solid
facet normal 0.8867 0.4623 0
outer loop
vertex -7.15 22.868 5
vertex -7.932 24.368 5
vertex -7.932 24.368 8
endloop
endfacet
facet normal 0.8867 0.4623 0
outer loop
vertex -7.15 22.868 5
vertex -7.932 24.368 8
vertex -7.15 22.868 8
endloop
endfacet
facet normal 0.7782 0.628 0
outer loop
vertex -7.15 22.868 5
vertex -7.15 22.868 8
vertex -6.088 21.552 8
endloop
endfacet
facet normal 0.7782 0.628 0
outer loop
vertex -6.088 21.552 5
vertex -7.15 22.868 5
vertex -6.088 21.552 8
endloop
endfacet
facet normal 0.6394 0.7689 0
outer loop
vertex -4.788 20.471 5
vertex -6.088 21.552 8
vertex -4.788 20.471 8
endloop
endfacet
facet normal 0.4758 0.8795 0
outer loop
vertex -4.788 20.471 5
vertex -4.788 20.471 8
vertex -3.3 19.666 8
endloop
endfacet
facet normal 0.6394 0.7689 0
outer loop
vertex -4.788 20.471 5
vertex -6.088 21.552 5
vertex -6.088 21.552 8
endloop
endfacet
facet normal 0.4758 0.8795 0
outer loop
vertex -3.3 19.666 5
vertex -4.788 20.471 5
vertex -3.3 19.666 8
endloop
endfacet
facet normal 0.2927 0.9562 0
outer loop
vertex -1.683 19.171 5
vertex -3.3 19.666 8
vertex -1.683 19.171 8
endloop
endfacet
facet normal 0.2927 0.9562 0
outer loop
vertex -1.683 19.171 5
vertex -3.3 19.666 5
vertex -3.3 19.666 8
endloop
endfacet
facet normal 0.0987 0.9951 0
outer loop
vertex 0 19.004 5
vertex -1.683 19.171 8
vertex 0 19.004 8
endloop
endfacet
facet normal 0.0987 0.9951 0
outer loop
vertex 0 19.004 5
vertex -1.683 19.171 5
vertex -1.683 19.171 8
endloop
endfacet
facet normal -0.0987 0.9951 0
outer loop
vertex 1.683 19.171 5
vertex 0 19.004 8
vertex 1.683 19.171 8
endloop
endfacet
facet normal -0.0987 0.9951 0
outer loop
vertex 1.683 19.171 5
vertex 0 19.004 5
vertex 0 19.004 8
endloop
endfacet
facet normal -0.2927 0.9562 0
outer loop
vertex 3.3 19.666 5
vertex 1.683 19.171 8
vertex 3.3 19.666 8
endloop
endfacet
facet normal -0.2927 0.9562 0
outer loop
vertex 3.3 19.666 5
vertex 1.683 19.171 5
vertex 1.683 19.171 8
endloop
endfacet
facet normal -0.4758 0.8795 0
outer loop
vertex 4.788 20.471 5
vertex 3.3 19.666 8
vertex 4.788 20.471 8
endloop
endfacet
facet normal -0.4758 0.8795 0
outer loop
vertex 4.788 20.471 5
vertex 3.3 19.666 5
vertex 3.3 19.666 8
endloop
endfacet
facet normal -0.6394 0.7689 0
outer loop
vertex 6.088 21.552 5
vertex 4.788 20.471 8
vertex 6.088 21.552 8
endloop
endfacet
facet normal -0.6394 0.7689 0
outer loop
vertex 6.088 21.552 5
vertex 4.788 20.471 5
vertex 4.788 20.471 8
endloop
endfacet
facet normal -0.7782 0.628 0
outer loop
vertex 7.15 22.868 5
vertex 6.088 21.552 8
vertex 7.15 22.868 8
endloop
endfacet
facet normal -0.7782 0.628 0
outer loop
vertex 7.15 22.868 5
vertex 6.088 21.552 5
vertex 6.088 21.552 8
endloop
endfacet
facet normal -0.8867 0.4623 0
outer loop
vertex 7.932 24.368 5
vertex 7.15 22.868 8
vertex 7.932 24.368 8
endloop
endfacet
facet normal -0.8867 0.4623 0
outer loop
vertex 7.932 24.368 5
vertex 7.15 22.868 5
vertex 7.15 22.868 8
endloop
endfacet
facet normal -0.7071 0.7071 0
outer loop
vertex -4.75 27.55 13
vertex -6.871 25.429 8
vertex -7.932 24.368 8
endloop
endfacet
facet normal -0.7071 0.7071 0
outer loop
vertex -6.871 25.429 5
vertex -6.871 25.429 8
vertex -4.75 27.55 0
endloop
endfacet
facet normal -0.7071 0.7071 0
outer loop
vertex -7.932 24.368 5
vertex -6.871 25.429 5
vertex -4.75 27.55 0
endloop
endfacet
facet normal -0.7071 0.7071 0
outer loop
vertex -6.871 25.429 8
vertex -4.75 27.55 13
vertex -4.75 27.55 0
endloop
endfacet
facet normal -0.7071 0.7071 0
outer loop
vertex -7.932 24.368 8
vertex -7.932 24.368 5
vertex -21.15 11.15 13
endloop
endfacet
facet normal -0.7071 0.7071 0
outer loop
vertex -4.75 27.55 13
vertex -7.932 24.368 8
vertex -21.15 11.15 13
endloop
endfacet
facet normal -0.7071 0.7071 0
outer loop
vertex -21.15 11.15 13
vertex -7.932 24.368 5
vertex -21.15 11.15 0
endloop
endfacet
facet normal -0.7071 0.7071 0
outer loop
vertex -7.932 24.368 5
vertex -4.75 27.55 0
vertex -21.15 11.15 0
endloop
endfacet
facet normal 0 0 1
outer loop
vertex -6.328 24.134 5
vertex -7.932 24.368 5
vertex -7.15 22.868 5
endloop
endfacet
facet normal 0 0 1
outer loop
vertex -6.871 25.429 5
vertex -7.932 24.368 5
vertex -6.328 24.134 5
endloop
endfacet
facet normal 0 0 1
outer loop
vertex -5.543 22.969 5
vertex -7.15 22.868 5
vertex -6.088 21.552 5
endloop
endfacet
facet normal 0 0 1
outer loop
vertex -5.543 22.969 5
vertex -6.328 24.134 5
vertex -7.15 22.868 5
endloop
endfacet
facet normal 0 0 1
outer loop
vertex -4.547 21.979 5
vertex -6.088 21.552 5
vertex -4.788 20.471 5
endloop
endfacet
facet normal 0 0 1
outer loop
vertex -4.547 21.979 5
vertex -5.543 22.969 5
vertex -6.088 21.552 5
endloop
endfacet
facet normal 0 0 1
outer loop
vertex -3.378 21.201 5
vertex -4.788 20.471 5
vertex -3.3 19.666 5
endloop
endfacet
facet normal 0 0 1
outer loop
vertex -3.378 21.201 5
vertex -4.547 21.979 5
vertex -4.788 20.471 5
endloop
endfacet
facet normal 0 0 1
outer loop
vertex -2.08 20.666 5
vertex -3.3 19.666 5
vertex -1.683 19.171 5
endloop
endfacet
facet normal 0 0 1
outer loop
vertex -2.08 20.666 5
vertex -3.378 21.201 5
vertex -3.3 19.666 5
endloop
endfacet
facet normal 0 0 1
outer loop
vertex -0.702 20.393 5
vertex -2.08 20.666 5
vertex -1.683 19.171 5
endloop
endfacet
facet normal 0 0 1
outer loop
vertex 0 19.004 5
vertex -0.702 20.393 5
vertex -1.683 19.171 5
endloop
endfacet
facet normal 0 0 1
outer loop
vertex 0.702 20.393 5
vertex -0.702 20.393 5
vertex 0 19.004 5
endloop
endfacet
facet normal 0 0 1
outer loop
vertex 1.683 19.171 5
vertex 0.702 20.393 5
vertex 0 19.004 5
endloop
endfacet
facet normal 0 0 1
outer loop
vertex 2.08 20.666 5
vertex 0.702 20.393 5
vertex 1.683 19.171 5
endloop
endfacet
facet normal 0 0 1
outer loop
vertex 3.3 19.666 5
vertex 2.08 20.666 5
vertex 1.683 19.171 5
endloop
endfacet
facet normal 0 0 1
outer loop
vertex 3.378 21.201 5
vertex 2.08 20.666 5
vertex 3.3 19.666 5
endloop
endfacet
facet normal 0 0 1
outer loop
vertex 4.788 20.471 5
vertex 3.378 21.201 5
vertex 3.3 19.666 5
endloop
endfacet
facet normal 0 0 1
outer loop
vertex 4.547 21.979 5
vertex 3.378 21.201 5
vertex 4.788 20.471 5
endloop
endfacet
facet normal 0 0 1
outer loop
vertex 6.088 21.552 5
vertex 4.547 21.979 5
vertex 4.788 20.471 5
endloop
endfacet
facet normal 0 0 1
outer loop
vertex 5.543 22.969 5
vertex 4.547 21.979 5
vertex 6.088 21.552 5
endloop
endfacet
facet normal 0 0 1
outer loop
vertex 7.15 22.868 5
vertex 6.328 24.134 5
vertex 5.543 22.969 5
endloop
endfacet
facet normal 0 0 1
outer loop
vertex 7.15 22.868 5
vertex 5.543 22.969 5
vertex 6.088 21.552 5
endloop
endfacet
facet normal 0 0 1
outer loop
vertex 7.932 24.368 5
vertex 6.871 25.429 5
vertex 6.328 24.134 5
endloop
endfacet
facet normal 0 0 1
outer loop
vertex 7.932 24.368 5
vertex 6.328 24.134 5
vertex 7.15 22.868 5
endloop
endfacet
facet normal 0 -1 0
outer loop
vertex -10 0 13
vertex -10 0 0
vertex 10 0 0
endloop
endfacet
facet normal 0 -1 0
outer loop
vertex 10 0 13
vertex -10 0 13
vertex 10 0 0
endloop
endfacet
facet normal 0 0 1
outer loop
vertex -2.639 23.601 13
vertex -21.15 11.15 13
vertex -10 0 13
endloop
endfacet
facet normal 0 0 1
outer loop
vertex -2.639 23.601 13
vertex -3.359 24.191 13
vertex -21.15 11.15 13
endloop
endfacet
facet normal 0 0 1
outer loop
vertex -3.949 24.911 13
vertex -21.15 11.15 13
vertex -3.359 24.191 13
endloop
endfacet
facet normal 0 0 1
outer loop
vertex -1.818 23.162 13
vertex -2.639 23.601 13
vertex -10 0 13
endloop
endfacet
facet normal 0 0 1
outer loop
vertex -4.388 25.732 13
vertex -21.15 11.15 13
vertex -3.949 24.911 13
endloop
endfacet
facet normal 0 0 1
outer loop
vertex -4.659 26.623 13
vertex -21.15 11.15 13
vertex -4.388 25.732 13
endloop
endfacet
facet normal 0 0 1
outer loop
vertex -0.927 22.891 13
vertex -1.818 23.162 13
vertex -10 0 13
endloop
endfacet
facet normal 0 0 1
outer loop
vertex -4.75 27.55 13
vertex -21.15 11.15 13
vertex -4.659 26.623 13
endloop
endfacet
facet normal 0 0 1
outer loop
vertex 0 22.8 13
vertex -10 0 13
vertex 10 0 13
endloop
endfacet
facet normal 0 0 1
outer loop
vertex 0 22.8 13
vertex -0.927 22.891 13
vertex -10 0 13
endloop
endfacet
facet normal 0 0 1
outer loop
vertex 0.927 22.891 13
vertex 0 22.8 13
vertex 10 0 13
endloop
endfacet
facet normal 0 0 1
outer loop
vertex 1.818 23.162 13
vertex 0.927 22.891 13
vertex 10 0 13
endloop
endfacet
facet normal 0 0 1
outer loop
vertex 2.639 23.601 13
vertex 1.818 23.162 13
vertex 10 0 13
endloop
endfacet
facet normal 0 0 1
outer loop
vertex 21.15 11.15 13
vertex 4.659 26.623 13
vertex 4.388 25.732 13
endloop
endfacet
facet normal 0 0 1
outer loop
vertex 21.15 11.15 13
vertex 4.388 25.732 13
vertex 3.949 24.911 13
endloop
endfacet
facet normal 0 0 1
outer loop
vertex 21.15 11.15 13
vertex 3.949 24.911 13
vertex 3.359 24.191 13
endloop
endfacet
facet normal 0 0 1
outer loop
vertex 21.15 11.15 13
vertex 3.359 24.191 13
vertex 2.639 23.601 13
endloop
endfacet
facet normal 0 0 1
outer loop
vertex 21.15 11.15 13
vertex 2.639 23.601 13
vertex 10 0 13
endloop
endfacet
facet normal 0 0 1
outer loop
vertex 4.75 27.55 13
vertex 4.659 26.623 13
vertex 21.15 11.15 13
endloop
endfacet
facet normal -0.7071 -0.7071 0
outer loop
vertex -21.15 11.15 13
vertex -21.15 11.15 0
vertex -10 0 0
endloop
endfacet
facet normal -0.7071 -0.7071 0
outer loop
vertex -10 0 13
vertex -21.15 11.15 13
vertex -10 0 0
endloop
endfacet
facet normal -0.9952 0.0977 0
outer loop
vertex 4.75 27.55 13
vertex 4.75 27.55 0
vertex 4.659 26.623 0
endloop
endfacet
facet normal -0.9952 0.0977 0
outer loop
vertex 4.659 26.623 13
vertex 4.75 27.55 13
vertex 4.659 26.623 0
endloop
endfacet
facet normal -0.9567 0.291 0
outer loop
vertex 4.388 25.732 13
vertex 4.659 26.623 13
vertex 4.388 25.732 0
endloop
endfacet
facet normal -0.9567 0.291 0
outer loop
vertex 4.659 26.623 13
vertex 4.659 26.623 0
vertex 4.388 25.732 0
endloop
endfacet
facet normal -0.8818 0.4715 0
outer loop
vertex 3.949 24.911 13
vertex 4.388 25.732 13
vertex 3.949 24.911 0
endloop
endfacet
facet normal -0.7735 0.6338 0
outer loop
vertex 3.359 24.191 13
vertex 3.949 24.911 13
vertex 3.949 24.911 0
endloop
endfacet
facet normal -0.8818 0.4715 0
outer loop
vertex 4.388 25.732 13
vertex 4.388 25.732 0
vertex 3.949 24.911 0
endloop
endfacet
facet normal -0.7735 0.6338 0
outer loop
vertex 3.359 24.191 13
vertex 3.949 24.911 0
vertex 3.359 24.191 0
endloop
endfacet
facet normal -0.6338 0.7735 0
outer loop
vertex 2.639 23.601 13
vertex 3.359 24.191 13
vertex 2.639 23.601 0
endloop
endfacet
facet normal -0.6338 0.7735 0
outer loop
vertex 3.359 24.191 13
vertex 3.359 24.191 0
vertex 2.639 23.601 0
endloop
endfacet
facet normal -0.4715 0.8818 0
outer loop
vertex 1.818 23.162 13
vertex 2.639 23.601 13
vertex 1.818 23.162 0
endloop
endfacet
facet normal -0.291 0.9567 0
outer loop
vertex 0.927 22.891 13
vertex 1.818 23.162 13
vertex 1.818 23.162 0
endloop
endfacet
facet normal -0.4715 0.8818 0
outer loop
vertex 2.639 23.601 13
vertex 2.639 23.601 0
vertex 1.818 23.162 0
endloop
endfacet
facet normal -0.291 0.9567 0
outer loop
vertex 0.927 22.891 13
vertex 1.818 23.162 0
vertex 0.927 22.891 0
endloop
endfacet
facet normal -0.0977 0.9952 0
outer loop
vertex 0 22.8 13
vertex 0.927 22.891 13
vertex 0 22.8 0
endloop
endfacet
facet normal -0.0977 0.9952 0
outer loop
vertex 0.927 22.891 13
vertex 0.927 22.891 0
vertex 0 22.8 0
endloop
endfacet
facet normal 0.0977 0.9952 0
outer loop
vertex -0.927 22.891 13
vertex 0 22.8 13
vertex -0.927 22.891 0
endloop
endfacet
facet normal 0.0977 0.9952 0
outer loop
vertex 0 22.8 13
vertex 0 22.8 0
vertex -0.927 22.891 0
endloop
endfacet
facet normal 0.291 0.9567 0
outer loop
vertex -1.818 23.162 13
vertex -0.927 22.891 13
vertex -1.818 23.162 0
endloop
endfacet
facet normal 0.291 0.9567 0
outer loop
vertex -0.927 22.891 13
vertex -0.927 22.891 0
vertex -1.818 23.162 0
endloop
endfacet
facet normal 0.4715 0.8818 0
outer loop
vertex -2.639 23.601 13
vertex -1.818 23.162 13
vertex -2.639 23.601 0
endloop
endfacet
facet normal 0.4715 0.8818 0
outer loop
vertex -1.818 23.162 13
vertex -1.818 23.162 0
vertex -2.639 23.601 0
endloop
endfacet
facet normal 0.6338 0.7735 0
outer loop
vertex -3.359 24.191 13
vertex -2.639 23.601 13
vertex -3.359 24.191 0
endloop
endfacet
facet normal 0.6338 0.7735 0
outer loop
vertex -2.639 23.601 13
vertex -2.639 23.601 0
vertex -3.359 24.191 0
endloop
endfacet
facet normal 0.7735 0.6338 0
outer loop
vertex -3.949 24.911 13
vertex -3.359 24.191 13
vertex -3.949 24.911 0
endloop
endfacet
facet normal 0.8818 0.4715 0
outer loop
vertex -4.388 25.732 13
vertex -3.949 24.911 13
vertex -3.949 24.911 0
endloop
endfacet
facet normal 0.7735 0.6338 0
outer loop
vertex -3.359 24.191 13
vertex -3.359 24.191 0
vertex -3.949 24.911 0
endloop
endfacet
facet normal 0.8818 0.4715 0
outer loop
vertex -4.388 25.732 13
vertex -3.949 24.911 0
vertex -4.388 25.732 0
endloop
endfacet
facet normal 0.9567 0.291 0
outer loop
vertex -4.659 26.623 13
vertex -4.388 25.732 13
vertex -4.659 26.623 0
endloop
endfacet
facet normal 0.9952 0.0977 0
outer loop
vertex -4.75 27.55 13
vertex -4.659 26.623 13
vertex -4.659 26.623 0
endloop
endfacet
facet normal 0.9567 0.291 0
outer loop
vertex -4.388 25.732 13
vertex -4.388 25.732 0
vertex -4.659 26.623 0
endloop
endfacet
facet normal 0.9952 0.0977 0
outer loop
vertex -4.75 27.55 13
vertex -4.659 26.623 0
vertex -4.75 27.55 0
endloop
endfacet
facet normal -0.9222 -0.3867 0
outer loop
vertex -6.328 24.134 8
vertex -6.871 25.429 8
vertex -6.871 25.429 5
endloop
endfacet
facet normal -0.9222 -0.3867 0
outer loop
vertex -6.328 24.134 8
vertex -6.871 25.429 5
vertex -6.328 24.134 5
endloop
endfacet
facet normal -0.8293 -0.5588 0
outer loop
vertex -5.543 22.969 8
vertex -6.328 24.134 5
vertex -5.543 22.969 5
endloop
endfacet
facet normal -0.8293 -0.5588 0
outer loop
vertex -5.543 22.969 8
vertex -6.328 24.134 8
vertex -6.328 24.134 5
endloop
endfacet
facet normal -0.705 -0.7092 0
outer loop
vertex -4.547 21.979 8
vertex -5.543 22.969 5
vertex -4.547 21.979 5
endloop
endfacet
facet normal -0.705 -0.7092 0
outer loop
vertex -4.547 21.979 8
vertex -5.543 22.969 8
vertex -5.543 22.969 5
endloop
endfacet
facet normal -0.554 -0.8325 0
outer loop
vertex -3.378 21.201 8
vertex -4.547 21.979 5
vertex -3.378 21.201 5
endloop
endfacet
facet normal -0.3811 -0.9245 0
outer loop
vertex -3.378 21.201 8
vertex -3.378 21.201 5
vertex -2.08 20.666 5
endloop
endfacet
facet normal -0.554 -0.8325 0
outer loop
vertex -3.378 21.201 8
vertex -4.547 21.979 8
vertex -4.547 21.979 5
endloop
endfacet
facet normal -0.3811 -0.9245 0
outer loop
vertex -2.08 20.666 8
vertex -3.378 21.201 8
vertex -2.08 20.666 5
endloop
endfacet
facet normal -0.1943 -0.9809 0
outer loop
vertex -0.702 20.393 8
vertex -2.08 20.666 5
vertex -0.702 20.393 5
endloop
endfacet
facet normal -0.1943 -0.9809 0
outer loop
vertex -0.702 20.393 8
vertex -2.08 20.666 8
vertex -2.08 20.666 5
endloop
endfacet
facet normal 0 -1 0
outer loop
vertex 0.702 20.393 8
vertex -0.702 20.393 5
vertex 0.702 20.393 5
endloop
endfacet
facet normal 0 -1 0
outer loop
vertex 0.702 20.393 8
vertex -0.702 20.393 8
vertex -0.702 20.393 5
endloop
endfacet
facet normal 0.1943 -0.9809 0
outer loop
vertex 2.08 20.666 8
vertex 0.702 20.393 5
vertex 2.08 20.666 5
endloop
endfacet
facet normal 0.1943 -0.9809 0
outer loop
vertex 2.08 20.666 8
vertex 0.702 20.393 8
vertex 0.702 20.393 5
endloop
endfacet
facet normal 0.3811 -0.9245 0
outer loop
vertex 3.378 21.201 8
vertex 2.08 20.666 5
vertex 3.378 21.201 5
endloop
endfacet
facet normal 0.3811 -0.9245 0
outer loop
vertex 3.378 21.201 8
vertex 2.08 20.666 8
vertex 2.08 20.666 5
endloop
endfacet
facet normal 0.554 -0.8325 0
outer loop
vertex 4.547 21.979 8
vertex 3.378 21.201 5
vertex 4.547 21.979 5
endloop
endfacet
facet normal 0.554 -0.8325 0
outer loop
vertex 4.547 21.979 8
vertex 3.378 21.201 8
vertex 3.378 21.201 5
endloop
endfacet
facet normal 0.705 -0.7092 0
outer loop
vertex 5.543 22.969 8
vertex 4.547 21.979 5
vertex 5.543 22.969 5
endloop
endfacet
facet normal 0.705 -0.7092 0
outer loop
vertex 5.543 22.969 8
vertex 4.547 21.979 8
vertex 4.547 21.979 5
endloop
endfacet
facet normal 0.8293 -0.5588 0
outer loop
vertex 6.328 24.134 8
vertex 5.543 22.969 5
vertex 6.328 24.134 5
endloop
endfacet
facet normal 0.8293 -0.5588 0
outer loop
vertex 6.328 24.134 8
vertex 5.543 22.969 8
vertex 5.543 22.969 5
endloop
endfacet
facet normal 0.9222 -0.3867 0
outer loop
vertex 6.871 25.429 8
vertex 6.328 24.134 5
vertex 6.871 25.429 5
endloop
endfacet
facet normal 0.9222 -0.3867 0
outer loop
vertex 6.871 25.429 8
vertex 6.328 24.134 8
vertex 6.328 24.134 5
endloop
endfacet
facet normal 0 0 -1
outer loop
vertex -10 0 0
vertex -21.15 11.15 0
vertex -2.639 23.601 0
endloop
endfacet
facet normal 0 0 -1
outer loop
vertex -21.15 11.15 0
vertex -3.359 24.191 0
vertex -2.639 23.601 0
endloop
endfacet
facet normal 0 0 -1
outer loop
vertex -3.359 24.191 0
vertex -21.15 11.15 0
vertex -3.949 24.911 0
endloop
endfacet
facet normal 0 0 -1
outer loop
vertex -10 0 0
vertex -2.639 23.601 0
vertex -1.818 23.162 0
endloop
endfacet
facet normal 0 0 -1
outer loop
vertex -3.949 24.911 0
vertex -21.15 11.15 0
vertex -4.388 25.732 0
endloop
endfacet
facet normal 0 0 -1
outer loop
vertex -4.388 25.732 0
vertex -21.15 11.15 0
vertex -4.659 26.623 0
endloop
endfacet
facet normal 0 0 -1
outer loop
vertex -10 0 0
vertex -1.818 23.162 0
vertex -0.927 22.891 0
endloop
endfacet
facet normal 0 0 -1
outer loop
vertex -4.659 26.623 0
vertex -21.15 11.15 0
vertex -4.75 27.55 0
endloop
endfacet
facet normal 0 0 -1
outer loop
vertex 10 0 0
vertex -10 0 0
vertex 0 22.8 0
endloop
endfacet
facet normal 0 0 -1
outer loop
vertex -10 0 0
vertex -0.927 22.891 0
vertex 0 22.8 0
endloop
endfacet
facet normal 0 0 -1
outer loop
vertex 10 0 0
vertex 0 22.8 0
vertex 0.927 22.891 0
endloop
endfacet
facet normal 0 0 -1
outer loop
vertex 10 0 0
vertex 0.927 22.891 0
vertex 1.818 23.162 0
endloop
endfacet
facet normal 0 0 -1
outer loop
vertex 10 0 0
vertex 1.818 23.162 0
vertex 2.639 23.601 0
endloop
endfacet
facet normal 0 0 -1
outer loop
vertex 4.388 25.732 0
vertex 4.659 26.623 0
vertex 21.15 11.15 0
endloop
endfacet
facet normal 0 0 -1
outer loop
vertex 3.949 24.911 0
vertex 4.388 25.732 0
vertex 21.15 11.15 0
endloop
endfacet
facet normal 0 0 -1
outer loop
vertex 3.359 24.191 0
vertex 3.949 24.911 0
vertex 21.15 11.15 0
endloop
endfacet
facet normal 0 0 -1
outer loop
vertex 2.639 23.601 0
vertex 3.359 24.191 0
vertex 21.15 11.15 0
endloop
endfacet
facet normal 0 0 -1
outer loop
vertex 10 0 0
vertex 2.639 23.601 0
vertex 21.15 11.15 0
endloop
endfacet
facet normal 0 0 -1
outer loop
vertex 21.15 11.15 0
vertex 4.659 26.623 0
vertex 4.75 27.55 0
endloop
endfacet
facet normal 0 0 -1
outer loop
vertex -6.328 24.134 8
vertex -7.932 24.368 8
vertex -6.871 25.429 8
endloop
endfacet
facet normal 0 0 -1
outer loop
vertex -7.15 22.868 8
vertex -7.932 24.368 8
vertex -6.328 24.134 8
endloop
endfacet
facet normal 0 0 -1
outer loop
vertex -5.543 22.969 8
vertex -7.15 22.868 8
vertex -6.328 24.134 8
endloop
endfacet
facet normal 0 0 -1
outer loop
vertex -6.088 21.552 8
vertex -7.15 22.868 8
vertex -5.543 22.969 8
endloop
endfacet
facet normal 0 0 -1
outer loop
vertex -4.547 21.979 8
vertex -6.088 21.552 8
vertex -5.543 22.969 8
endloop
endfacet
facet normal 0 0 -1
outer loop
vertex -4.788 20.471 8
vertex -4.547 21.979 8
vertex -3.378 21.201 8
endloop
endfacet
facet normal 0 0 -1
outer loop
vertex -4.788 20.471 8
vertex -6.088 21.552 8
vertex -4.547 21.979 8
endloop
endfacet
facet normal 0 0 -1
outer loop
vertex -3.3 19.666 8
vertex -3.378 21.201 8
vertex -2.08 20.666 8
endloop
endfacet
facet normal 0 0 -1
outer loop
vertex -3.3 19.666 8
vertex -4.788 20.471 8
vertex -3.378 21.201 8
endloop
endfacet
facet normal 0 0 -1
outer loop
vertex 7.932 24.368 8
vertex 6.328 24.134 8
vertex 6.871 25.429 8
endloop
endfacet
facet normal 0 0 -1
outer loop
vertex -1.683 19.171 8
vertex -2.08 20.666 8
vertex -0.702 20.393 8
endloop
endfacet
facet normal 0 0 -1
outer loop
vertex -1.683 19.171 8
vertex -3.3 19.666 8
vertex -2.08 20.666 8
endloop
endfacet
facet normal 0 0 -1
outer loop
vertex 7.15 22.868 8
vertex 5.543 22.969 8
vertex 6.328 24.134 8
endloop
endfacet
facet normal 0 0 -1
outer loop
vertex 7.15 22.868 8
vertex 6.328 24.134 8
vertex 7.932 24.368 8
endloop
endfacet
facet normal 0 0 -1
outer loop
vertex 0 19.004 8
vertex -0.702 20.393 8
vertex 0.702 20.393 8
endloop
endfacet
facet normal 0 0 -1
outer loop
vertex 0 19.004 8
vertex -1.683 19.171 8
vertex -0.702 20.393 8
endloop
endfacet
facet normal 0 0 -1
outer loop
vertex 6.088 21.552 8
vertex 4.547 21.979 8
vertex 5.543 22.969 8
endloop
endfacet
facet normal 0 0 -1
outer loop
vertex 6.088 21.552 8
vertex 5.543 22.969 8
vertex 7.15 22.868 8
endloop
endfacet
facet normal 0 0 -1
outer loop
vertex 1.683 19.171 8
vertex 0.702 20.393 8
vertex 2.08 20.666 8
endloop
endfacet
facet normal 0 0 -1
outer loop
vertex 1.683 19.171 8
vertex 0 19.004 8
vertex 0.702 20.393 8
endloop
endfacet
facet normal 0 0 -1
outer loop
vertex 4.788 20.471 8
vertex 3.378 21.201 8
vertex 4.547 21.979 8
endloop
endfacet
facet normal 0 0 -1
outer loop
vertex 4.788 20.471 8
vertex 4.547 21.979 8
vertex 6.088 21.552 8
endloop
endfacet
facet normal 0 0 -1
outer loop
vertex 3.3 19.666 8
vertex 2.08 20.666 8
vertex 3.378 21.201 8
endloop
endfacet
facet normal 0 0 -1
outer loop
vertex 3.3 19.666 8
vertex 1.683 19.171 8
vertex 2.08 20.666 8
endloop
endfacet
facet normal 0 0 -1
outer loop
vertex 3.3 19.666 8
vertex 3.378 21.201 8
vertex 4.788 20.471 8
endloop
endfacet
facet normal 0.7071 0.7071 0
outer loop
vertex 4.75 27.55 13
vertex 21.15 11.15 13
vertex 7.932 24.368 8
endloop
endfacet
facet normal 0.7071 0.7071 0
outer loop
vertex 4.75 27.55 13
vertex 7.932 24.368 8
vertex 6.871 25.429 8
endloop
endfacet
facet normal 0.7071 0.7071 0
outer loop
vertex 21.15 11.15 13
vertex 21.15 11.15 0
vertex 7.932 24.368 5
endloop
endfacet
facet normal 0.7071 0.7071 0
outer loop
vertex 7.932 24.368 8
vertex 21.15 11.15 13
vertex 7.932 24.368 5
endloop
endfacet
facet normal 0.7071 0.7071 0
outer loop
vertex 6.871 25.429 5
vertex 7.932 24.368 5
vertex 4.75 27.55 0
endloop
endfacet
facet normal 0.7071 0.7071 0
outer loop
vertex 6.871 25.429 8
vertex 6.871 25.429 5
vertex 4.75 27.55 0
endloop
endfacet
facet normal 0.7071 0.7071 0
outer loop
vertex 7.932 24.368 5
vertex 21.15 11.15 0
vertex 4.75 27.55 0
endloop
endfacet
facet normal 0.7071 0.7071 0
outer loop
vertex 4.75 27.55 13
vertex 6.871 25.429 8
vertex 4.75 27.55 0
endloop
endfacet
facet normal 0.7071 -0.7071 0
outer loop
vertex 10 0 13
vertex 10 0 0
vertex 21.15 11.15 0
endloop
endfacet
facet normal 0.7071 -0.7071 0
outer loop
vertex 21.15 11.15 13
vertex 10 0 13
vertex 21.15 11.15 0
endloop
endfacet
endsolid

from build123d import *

# Parameters (mm, degrees)
F1_DEPTH = 13
F2_W     = 1.5
F2_H     = 3


with BuildPart() as f1:
    # F0 (on Top) → F1 (new body)
    with BuildSketch(Plane.XY):
        with BuildLine():
            Line((21.15, 11.15), (4.75, 27.55))
            ThreePointArc((4.75, 27.55), (0, 22.8), (-4.75, 27.55))
            Line((-4.75, 27.55), (-21.15, 11.15))
            Line((-21.15, 11.15), (-10, 0))
            Line((-10, 0), (0, 0))
            Line((0, 0), (10, 0))
            Line((10, 0), (21.15, 11.15))
        make_face()
    extrude(amount=F1_DEPTH)

    # F3: sweep along a path in F3_path
    with BuildLine(Plane(origin=(-4.75, 27.55, 13), x_dir=(0, -1, 0), z_dir=(0, 0, -1))) as f3_path:
        ThreePointArc((0, 0), (4.75, -4.75), (0, -9.5))
    # F2 (on face) → F3 (sweep, cut)
    with BuildSketch(Plane(origin=(16.15, 16.15, 0), x_dir=(-0.7071067812, 0.7071067812, 0), z_dir=(0.7071067812, 0.7071067812, 0))):
        with Locations((12.3720346111, 6.5)):
            Rectangle(F2_W, F2_H)
    sweep(path=f3_path.line, mode=Mode.SUBTRACT)


solid = f1.part
